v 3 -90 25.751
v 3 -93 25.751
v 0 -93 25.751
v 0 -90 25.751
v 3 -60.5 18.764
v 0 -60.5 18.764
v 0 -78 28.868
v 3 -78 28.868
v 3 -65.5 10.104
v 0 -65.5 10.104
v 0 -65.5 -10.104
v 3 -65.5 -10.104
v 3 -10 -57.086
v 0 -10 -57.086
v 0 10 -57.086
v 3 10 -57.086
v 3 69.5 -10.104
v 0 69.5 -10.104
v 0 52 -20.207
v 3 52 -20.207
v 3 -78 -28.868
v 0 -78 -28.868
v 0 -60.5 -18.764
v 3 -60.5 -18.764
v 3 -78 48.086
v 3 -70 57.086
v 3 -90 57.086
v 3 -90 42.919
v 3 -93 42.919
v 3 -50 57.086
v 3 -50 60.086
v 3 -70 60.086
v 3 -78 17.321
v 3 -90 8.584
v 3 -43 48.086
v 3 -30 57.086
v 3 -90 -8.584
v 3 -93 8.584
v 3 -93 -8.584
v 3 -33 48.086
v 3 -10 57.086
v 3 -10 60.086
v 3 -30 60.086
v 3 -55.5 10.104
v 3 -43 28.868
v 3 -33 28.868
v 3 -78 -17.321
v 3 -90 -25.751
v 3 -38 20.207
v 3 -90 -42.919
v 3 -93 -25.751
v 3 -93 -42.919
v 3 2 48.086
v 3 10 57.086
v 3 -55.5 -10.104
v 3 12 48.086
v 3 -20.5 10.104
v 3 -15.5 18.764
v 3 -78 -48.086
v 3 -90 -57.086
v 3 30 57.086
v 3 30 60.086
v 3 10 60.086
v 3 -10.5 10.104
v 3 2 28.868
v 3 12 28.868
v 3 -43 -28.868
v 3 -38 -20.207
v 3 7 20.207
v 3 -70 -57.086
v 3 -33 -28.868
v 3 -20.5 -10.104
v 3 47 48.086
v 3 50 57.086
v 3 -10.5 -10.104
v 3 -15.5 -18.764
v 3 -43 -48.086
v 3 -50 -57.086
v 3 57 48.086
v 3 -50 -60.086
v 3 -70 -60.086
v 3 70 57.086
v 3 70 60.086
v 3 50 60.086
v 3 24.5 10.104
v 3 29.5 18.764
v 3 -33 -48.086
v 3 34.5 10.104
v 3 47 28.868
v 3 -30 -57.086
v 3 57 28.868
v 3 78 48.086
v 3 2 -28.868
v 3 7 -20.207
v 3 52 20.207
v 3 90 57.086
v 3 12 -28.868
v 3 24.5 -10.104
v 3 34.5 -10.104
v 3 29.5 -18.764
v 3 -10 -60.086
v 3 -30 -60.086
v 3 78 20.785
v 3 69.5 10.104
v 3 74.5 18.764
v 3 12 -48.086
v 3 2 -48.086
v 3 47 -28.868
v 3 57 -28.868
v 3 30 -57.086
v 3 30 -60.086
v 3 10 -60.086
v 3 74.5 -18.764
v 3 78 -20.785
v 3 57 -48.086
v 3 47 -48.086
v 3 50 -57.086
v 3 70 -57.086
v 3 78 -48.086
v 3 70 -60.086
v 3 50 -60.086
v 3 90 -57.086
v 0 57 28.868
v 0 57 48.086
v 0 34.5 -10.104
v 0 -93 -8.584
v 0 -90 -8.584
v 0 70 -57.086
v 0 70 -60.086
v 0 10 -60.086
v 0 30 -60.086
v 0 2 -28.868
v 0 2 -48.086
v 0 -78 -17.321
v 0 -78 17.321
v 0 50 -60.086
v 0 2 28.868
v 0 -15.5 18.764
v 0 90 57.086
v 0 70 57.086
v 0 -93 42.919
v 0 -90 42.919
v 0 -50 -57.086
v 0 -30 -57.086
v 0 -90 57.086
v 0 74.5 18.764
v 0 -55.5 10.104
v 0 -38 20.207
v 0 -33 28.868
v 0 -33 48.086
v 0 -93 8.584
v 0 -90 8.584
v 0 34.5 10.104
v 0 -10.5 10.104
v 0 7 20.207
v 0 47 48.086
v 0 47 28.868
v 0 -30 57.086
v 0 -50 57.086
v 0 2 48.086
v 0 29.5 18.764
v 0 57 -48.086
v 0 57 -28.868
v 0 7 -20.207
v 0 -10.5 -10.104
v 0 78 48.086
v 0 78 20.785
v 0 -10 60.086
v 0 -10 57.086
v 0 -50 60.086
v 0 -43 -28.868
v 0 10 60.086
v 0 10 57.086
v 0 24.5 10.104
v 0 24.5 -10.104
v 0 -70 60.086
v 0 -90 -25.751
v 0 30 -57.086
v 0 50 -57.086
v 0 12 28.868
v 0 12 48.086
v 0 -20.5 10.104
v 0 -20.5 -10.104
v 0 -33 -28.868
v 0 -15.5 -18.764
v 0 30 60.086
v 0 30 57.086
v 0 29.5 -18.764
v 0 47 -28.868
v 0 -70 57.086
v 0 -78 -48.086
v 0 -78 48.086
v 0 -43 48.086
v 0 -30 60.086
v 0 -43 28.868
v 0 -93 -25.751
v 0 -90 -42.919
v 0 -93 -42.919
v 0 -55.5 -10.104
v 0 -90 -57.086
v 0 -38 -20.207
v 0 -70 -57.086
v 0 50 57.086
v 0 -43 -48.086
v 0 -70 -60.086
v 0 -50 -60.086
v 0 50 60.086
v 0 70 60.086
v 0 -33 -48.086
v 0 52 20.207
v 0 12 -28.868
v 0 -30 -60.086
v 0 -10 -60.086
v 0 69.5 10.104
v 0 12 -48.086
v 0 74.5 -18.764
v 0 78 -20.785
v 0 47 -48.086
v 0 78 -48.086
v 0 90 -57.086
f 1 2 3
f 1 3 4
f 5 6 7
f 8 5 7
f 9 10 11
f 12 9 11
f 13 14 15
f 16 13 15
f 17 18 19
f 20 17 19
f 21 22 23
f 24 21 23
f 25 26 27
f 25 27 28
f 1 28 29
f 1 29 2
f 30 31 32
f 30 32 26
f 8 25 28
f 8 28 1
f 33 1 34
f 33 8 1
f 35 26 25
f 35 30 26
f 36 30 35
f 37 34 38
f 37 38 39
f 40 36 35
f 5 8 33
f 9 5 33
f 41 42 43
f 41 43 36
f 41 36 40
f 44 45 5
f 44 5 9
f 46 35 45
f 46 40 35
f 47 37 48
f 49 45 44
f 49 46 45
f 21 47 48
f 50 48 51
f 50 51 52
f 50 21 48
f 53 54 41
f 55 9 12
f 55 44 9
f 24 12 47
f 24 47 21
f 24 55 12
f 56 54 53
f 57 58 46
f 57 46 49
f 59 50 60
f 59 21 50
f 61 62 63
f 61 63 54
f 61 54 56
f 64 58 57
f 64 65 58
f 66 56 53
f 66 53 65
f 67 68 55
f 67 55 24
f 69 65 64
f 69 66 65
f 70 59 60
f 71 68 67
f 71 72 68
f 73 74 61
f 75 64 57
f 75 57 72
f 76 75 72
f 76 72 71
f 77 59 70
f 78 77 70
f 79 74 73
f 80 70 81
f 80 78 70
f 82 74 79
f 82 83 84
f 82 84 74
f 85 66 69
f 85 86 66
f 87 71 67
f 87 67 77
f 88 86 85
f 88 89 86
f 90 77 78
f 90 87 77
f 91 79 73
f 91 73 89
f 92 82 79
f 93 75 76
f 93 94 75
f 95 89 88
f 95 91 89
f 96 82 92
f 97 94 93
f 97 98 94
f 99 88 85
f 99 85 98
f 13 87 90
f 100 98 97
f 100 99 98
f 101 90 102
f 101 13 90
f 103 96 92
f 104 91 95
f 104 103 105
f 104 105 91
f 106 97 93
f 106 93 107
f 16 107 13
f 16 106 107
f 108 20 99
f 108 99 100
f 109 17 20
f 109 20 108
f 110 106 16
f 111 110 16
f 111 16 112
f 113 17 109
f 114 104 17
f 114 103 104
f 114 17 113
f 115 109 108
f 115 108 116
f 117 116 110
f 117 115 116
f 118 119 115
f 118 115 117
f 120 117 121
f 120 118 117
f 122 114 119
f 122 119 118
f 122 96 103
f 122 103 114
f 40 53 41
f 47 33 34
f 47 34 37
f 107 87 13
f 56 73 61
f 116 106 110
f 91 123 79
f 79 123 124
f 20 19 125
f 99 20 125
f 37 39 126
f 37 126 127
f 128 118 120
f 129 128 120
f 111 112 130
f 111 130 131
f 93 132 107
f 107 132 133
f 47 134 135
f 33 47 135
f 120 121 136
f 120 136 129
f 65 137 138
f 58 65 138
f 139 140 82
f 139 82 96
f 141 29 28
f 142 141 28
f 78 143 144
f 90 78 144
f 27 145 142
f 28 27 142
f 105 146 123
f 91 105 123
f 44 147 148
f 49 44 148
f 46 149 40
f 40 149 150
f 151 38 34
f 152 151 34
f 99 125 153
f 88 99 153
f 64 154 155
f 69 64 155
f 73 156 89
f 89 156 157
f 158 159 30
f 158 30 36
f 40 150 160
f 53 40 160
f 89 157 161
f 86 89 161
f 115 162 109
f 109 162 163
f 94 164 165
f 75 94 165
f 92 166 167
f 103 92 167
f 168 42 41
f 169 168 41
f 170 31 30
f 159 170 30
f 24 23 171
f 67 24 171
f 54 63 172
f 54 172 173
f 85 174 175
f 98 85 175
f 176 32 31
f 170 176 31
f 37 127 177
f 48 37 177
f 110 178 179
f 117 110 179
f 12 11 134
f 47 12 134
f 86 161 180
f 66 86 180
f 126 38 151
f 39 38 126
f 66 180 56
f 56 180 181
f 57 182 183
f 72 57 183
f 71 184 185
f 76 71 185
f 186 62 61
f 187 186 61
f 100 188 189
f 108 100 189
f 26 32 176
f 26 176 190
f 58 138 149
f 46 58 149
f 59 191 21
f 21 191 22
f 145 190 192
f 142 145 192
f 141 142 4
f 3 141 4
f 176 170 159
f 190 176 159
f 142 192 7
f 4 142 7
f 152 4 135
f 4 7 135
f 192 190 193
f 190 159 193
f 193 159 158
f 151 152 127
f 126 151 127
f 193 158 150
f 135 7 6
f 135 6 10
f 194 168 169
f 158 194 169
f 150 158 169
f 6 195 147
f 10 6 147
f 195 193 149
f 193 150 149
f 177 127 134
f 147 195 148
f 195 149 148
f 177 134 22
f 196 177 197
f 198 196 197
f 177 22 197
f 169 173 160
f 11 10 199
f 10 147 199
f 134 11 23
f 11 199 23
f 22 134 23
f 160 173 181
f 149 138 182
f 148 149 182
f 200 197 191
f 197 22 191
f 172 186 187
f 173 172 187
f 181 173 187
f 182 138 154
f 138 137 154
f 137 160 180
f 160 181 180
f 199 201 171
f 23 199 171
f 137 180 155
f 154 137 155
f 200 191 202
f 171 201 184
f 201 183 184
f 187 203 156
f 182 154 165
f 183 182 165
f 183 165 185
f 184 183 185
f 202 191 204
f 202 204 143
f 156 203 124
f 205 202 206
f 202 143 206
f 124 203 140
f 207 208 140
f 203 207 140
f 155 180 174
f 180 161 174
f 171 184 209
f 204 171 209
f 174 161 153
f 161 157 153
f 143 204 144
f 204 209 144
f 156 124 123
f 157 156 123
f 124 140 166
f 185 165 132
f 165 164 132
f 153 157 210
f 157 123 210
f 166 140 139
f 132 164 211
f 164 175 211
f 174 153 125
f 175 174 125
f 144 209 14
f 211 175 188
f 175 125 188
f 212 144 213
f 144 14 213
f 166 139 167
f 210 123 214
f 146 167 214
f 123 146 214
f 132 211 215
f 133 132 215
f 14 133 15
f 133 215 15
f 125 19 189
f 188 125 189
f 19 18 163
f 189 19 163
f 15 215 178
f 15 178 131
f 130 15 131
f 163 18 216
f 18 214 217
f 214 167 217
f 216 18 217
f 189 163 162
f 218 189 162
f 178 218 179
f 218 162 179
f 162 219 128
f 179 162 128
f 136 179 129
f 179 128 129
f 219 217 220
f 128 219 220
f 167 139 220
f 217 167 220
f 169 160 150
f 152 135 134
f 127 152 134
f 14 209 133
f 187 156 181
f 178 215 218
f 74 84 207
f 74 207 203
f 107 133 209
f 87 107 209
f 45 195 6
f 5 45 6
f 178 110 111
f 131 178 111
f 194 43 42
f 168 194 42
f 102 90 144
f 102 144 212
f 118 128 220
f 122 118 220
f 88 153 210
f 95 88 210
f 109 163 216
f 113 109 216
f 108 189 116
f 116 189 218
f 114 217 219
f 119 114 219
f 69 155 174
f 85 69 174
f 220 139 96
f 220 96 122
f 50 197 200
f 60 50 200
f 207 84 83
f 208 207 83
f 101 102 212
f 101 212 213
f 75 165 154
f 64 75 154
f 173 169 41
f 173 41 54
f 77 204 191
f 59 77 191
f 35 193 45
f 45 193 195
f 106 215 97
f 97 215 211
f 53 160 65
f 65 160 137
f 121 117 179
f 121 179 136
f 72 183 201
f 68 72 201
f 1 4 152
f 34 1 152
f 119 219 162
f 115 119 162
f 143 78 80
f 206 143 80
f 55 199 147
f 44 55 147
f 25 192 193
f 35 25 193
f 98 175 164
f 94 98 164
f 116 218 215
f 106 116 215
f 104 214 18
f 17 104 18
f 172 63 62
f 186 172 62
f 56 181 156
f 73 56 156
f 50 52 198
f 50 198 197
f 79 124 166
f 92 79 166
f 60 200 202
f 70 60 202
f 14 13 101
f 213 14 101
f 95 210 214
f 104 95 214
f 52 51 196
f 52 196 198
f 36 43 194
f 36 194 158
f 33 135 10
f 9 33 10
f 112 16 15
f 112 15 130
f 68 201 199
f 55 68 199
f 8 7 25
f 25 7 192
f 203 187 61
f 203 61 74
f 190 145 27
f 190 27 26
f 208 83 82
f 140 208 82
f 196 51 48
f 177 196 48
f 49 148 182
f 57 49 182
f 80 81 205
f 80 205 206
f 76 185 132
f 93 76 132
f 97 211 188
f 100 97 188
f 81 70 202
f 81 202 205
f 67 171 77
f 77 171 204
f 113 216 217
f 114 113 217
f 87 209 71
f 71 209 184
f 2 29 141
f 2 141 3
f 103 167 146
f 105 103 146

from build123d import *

# Parameters (mm, degrees)
SKETCH1_W           = 114.1727
SKETCH1_H           = 180
BOSS_EXTRUDE1_DEPTH = 3
SKETCH2_W           = 17.167528572
SKETCH2_H           = 3
SKETCH2_W_2         = 3
SKETCH2_H_2         = 20
BOSS_EXTRUDE2_DEPTH = 3
CUT_EXTRUDE1_DEPTH  = 10


with BuildPart() as part:
    # Sketch1 → Boss-Extrude1 (new body)
    with BuildSketch(Plane(origin=(0, 0, 0), x_dir=(0, 0, -1), z_dir=(1, 0, 0))):
        Rectangle(SKETCH1_W, SKETCH1_H)
    extrude(amount=BOSS_EXTRUDE1_DEPTH)

    # Sketch2 → Boss-Extrude2 (add)
    with BuildSketch(Plane(origin=(3, 0, 0), x_dir=(0, 0, -1), z_dir=(1, 0, 0))):
        with Locations((-34.335057143, -91.5)):
            Rectangle(SKETCH2_W, SKETCH2_H)
        with Locations((0, -91.5)):
            Rectangle(SKETCH2_W, SKETCH2_H)
        with Locations((34.335057143, -91.5)):
            Rectangle(SKETCH2_W, SKETCH2_H)
        with Locations((58.58635, -60)):
            Rectangle(SKETCH2_W_2, SKETCH2_H_2)
        with Locations((58.58635, -20)):
            Rectangle(SKETCH2_W_2, SKETCH2_H_2)
        with Locations((58.58635, 20)):
            Rectangle(SKETCH2_W_2, SKETCH2_H_2)
        with Locations((58.58635, 60)):
            Rectangle(SKETCH2_W_2, SKETCH2_H_2)
        with Locations((-58.58635, -60)):
            Rectangle(SKETCH2_W_2, SKETCH2_H_2)
        with Locations((-58.58635, -20)):
            Rectangle(SKETCH2_W_2, SKETCH2_H_2)
        with Locations((-58.58635, 20)):
            Rectangle(SKETCH2_W_2, SKETCH2_H_2)
        with Locations((-58.58635, 60)):
            Rectangle(SKETCH2_W_2, SKETCH2_H_2)
    extrude(amount=-BOSS_EXTRUDE2_DEPTH)

    # Sketch3 → Cut-Extrude1 (cut)
    with BuildSketch(Plane(origin=(0, 0, -3), x_dir=(0, 0, 1), z_dir=(-1, 0, 0))):
        Polygon((-25.867513459, -43), (-45.08635, -43), (-45.08635, -78), (-25.867513459, -78), (-15.763883749, -60.5), align=None)
        Polygon((-7.103629711, -65.5), (-14.320508076, -78), (20.320508076, -78), (13.103629711, -65.5), align=None)
        Polygon((21.763883749, -60.5), (31.867513459, -78), (51.08635, -78), (51.08635, -43), (31.867513459, -43), align=None)
        Polygon((23.207259422, -38), (13.103629711, -20.5), (-7.103629711, -20.5), (-17.207259422, -38), (-7.103629711, -55.5), (13.103629711, -55.5), align=None)
        Polygon((-45.08635, 2), (-45.08635, -33), (-25.867513459, -33), (-15.763883749, -15.5), (-25.867513459, 2), align=None)
        Polygon((23.207259422, 7), (13.103629711, 24.5), (-7.103629711, 24.5), (-17.207259422, 7), (-7.103629711, -10.5), (13.103629711, -10.5), align=None)
        Polygon((31.867513459, -33), (51.08635, -33), (51.08635, 2), (31.867513459, 2), (21.763883749, -15.5), align=None)
        Polygon((51.08635, 12), (51.08635, 47), (31.867513459, 47), (21.763883749, 29.5), (31.867513459, 12), align=None)
        Polygon((-45.08635, 47), (-45.08635, 12), (-25.867513459, 12), (-15.763883749, 29.5), (-25.867513459, 47), align=None)
        Polygon((23.207259422, 52), (13.103629711, 69.5), (-7.103629711, 69.5), (-17.207259422, 52), (-7.103629711, 34.5), (13.103629711, 34.5), align=None)
        Polygon((-45.08635, 78), (-45.08635, 57), (-25.867513459, 57), (-15.763883749, 74.5), (-17.784609691, 78), align=None)
        Polygon((51.08635, 78), (23.784609691, 78), (21.763883749, 74.5), (31.867513459, 57), (51.08635, 57), align=None)
    extrude(amount=-CUT_EXTRUDE1_DEPTH, mode=Mode.SUBTRACT)


solid = part.part
